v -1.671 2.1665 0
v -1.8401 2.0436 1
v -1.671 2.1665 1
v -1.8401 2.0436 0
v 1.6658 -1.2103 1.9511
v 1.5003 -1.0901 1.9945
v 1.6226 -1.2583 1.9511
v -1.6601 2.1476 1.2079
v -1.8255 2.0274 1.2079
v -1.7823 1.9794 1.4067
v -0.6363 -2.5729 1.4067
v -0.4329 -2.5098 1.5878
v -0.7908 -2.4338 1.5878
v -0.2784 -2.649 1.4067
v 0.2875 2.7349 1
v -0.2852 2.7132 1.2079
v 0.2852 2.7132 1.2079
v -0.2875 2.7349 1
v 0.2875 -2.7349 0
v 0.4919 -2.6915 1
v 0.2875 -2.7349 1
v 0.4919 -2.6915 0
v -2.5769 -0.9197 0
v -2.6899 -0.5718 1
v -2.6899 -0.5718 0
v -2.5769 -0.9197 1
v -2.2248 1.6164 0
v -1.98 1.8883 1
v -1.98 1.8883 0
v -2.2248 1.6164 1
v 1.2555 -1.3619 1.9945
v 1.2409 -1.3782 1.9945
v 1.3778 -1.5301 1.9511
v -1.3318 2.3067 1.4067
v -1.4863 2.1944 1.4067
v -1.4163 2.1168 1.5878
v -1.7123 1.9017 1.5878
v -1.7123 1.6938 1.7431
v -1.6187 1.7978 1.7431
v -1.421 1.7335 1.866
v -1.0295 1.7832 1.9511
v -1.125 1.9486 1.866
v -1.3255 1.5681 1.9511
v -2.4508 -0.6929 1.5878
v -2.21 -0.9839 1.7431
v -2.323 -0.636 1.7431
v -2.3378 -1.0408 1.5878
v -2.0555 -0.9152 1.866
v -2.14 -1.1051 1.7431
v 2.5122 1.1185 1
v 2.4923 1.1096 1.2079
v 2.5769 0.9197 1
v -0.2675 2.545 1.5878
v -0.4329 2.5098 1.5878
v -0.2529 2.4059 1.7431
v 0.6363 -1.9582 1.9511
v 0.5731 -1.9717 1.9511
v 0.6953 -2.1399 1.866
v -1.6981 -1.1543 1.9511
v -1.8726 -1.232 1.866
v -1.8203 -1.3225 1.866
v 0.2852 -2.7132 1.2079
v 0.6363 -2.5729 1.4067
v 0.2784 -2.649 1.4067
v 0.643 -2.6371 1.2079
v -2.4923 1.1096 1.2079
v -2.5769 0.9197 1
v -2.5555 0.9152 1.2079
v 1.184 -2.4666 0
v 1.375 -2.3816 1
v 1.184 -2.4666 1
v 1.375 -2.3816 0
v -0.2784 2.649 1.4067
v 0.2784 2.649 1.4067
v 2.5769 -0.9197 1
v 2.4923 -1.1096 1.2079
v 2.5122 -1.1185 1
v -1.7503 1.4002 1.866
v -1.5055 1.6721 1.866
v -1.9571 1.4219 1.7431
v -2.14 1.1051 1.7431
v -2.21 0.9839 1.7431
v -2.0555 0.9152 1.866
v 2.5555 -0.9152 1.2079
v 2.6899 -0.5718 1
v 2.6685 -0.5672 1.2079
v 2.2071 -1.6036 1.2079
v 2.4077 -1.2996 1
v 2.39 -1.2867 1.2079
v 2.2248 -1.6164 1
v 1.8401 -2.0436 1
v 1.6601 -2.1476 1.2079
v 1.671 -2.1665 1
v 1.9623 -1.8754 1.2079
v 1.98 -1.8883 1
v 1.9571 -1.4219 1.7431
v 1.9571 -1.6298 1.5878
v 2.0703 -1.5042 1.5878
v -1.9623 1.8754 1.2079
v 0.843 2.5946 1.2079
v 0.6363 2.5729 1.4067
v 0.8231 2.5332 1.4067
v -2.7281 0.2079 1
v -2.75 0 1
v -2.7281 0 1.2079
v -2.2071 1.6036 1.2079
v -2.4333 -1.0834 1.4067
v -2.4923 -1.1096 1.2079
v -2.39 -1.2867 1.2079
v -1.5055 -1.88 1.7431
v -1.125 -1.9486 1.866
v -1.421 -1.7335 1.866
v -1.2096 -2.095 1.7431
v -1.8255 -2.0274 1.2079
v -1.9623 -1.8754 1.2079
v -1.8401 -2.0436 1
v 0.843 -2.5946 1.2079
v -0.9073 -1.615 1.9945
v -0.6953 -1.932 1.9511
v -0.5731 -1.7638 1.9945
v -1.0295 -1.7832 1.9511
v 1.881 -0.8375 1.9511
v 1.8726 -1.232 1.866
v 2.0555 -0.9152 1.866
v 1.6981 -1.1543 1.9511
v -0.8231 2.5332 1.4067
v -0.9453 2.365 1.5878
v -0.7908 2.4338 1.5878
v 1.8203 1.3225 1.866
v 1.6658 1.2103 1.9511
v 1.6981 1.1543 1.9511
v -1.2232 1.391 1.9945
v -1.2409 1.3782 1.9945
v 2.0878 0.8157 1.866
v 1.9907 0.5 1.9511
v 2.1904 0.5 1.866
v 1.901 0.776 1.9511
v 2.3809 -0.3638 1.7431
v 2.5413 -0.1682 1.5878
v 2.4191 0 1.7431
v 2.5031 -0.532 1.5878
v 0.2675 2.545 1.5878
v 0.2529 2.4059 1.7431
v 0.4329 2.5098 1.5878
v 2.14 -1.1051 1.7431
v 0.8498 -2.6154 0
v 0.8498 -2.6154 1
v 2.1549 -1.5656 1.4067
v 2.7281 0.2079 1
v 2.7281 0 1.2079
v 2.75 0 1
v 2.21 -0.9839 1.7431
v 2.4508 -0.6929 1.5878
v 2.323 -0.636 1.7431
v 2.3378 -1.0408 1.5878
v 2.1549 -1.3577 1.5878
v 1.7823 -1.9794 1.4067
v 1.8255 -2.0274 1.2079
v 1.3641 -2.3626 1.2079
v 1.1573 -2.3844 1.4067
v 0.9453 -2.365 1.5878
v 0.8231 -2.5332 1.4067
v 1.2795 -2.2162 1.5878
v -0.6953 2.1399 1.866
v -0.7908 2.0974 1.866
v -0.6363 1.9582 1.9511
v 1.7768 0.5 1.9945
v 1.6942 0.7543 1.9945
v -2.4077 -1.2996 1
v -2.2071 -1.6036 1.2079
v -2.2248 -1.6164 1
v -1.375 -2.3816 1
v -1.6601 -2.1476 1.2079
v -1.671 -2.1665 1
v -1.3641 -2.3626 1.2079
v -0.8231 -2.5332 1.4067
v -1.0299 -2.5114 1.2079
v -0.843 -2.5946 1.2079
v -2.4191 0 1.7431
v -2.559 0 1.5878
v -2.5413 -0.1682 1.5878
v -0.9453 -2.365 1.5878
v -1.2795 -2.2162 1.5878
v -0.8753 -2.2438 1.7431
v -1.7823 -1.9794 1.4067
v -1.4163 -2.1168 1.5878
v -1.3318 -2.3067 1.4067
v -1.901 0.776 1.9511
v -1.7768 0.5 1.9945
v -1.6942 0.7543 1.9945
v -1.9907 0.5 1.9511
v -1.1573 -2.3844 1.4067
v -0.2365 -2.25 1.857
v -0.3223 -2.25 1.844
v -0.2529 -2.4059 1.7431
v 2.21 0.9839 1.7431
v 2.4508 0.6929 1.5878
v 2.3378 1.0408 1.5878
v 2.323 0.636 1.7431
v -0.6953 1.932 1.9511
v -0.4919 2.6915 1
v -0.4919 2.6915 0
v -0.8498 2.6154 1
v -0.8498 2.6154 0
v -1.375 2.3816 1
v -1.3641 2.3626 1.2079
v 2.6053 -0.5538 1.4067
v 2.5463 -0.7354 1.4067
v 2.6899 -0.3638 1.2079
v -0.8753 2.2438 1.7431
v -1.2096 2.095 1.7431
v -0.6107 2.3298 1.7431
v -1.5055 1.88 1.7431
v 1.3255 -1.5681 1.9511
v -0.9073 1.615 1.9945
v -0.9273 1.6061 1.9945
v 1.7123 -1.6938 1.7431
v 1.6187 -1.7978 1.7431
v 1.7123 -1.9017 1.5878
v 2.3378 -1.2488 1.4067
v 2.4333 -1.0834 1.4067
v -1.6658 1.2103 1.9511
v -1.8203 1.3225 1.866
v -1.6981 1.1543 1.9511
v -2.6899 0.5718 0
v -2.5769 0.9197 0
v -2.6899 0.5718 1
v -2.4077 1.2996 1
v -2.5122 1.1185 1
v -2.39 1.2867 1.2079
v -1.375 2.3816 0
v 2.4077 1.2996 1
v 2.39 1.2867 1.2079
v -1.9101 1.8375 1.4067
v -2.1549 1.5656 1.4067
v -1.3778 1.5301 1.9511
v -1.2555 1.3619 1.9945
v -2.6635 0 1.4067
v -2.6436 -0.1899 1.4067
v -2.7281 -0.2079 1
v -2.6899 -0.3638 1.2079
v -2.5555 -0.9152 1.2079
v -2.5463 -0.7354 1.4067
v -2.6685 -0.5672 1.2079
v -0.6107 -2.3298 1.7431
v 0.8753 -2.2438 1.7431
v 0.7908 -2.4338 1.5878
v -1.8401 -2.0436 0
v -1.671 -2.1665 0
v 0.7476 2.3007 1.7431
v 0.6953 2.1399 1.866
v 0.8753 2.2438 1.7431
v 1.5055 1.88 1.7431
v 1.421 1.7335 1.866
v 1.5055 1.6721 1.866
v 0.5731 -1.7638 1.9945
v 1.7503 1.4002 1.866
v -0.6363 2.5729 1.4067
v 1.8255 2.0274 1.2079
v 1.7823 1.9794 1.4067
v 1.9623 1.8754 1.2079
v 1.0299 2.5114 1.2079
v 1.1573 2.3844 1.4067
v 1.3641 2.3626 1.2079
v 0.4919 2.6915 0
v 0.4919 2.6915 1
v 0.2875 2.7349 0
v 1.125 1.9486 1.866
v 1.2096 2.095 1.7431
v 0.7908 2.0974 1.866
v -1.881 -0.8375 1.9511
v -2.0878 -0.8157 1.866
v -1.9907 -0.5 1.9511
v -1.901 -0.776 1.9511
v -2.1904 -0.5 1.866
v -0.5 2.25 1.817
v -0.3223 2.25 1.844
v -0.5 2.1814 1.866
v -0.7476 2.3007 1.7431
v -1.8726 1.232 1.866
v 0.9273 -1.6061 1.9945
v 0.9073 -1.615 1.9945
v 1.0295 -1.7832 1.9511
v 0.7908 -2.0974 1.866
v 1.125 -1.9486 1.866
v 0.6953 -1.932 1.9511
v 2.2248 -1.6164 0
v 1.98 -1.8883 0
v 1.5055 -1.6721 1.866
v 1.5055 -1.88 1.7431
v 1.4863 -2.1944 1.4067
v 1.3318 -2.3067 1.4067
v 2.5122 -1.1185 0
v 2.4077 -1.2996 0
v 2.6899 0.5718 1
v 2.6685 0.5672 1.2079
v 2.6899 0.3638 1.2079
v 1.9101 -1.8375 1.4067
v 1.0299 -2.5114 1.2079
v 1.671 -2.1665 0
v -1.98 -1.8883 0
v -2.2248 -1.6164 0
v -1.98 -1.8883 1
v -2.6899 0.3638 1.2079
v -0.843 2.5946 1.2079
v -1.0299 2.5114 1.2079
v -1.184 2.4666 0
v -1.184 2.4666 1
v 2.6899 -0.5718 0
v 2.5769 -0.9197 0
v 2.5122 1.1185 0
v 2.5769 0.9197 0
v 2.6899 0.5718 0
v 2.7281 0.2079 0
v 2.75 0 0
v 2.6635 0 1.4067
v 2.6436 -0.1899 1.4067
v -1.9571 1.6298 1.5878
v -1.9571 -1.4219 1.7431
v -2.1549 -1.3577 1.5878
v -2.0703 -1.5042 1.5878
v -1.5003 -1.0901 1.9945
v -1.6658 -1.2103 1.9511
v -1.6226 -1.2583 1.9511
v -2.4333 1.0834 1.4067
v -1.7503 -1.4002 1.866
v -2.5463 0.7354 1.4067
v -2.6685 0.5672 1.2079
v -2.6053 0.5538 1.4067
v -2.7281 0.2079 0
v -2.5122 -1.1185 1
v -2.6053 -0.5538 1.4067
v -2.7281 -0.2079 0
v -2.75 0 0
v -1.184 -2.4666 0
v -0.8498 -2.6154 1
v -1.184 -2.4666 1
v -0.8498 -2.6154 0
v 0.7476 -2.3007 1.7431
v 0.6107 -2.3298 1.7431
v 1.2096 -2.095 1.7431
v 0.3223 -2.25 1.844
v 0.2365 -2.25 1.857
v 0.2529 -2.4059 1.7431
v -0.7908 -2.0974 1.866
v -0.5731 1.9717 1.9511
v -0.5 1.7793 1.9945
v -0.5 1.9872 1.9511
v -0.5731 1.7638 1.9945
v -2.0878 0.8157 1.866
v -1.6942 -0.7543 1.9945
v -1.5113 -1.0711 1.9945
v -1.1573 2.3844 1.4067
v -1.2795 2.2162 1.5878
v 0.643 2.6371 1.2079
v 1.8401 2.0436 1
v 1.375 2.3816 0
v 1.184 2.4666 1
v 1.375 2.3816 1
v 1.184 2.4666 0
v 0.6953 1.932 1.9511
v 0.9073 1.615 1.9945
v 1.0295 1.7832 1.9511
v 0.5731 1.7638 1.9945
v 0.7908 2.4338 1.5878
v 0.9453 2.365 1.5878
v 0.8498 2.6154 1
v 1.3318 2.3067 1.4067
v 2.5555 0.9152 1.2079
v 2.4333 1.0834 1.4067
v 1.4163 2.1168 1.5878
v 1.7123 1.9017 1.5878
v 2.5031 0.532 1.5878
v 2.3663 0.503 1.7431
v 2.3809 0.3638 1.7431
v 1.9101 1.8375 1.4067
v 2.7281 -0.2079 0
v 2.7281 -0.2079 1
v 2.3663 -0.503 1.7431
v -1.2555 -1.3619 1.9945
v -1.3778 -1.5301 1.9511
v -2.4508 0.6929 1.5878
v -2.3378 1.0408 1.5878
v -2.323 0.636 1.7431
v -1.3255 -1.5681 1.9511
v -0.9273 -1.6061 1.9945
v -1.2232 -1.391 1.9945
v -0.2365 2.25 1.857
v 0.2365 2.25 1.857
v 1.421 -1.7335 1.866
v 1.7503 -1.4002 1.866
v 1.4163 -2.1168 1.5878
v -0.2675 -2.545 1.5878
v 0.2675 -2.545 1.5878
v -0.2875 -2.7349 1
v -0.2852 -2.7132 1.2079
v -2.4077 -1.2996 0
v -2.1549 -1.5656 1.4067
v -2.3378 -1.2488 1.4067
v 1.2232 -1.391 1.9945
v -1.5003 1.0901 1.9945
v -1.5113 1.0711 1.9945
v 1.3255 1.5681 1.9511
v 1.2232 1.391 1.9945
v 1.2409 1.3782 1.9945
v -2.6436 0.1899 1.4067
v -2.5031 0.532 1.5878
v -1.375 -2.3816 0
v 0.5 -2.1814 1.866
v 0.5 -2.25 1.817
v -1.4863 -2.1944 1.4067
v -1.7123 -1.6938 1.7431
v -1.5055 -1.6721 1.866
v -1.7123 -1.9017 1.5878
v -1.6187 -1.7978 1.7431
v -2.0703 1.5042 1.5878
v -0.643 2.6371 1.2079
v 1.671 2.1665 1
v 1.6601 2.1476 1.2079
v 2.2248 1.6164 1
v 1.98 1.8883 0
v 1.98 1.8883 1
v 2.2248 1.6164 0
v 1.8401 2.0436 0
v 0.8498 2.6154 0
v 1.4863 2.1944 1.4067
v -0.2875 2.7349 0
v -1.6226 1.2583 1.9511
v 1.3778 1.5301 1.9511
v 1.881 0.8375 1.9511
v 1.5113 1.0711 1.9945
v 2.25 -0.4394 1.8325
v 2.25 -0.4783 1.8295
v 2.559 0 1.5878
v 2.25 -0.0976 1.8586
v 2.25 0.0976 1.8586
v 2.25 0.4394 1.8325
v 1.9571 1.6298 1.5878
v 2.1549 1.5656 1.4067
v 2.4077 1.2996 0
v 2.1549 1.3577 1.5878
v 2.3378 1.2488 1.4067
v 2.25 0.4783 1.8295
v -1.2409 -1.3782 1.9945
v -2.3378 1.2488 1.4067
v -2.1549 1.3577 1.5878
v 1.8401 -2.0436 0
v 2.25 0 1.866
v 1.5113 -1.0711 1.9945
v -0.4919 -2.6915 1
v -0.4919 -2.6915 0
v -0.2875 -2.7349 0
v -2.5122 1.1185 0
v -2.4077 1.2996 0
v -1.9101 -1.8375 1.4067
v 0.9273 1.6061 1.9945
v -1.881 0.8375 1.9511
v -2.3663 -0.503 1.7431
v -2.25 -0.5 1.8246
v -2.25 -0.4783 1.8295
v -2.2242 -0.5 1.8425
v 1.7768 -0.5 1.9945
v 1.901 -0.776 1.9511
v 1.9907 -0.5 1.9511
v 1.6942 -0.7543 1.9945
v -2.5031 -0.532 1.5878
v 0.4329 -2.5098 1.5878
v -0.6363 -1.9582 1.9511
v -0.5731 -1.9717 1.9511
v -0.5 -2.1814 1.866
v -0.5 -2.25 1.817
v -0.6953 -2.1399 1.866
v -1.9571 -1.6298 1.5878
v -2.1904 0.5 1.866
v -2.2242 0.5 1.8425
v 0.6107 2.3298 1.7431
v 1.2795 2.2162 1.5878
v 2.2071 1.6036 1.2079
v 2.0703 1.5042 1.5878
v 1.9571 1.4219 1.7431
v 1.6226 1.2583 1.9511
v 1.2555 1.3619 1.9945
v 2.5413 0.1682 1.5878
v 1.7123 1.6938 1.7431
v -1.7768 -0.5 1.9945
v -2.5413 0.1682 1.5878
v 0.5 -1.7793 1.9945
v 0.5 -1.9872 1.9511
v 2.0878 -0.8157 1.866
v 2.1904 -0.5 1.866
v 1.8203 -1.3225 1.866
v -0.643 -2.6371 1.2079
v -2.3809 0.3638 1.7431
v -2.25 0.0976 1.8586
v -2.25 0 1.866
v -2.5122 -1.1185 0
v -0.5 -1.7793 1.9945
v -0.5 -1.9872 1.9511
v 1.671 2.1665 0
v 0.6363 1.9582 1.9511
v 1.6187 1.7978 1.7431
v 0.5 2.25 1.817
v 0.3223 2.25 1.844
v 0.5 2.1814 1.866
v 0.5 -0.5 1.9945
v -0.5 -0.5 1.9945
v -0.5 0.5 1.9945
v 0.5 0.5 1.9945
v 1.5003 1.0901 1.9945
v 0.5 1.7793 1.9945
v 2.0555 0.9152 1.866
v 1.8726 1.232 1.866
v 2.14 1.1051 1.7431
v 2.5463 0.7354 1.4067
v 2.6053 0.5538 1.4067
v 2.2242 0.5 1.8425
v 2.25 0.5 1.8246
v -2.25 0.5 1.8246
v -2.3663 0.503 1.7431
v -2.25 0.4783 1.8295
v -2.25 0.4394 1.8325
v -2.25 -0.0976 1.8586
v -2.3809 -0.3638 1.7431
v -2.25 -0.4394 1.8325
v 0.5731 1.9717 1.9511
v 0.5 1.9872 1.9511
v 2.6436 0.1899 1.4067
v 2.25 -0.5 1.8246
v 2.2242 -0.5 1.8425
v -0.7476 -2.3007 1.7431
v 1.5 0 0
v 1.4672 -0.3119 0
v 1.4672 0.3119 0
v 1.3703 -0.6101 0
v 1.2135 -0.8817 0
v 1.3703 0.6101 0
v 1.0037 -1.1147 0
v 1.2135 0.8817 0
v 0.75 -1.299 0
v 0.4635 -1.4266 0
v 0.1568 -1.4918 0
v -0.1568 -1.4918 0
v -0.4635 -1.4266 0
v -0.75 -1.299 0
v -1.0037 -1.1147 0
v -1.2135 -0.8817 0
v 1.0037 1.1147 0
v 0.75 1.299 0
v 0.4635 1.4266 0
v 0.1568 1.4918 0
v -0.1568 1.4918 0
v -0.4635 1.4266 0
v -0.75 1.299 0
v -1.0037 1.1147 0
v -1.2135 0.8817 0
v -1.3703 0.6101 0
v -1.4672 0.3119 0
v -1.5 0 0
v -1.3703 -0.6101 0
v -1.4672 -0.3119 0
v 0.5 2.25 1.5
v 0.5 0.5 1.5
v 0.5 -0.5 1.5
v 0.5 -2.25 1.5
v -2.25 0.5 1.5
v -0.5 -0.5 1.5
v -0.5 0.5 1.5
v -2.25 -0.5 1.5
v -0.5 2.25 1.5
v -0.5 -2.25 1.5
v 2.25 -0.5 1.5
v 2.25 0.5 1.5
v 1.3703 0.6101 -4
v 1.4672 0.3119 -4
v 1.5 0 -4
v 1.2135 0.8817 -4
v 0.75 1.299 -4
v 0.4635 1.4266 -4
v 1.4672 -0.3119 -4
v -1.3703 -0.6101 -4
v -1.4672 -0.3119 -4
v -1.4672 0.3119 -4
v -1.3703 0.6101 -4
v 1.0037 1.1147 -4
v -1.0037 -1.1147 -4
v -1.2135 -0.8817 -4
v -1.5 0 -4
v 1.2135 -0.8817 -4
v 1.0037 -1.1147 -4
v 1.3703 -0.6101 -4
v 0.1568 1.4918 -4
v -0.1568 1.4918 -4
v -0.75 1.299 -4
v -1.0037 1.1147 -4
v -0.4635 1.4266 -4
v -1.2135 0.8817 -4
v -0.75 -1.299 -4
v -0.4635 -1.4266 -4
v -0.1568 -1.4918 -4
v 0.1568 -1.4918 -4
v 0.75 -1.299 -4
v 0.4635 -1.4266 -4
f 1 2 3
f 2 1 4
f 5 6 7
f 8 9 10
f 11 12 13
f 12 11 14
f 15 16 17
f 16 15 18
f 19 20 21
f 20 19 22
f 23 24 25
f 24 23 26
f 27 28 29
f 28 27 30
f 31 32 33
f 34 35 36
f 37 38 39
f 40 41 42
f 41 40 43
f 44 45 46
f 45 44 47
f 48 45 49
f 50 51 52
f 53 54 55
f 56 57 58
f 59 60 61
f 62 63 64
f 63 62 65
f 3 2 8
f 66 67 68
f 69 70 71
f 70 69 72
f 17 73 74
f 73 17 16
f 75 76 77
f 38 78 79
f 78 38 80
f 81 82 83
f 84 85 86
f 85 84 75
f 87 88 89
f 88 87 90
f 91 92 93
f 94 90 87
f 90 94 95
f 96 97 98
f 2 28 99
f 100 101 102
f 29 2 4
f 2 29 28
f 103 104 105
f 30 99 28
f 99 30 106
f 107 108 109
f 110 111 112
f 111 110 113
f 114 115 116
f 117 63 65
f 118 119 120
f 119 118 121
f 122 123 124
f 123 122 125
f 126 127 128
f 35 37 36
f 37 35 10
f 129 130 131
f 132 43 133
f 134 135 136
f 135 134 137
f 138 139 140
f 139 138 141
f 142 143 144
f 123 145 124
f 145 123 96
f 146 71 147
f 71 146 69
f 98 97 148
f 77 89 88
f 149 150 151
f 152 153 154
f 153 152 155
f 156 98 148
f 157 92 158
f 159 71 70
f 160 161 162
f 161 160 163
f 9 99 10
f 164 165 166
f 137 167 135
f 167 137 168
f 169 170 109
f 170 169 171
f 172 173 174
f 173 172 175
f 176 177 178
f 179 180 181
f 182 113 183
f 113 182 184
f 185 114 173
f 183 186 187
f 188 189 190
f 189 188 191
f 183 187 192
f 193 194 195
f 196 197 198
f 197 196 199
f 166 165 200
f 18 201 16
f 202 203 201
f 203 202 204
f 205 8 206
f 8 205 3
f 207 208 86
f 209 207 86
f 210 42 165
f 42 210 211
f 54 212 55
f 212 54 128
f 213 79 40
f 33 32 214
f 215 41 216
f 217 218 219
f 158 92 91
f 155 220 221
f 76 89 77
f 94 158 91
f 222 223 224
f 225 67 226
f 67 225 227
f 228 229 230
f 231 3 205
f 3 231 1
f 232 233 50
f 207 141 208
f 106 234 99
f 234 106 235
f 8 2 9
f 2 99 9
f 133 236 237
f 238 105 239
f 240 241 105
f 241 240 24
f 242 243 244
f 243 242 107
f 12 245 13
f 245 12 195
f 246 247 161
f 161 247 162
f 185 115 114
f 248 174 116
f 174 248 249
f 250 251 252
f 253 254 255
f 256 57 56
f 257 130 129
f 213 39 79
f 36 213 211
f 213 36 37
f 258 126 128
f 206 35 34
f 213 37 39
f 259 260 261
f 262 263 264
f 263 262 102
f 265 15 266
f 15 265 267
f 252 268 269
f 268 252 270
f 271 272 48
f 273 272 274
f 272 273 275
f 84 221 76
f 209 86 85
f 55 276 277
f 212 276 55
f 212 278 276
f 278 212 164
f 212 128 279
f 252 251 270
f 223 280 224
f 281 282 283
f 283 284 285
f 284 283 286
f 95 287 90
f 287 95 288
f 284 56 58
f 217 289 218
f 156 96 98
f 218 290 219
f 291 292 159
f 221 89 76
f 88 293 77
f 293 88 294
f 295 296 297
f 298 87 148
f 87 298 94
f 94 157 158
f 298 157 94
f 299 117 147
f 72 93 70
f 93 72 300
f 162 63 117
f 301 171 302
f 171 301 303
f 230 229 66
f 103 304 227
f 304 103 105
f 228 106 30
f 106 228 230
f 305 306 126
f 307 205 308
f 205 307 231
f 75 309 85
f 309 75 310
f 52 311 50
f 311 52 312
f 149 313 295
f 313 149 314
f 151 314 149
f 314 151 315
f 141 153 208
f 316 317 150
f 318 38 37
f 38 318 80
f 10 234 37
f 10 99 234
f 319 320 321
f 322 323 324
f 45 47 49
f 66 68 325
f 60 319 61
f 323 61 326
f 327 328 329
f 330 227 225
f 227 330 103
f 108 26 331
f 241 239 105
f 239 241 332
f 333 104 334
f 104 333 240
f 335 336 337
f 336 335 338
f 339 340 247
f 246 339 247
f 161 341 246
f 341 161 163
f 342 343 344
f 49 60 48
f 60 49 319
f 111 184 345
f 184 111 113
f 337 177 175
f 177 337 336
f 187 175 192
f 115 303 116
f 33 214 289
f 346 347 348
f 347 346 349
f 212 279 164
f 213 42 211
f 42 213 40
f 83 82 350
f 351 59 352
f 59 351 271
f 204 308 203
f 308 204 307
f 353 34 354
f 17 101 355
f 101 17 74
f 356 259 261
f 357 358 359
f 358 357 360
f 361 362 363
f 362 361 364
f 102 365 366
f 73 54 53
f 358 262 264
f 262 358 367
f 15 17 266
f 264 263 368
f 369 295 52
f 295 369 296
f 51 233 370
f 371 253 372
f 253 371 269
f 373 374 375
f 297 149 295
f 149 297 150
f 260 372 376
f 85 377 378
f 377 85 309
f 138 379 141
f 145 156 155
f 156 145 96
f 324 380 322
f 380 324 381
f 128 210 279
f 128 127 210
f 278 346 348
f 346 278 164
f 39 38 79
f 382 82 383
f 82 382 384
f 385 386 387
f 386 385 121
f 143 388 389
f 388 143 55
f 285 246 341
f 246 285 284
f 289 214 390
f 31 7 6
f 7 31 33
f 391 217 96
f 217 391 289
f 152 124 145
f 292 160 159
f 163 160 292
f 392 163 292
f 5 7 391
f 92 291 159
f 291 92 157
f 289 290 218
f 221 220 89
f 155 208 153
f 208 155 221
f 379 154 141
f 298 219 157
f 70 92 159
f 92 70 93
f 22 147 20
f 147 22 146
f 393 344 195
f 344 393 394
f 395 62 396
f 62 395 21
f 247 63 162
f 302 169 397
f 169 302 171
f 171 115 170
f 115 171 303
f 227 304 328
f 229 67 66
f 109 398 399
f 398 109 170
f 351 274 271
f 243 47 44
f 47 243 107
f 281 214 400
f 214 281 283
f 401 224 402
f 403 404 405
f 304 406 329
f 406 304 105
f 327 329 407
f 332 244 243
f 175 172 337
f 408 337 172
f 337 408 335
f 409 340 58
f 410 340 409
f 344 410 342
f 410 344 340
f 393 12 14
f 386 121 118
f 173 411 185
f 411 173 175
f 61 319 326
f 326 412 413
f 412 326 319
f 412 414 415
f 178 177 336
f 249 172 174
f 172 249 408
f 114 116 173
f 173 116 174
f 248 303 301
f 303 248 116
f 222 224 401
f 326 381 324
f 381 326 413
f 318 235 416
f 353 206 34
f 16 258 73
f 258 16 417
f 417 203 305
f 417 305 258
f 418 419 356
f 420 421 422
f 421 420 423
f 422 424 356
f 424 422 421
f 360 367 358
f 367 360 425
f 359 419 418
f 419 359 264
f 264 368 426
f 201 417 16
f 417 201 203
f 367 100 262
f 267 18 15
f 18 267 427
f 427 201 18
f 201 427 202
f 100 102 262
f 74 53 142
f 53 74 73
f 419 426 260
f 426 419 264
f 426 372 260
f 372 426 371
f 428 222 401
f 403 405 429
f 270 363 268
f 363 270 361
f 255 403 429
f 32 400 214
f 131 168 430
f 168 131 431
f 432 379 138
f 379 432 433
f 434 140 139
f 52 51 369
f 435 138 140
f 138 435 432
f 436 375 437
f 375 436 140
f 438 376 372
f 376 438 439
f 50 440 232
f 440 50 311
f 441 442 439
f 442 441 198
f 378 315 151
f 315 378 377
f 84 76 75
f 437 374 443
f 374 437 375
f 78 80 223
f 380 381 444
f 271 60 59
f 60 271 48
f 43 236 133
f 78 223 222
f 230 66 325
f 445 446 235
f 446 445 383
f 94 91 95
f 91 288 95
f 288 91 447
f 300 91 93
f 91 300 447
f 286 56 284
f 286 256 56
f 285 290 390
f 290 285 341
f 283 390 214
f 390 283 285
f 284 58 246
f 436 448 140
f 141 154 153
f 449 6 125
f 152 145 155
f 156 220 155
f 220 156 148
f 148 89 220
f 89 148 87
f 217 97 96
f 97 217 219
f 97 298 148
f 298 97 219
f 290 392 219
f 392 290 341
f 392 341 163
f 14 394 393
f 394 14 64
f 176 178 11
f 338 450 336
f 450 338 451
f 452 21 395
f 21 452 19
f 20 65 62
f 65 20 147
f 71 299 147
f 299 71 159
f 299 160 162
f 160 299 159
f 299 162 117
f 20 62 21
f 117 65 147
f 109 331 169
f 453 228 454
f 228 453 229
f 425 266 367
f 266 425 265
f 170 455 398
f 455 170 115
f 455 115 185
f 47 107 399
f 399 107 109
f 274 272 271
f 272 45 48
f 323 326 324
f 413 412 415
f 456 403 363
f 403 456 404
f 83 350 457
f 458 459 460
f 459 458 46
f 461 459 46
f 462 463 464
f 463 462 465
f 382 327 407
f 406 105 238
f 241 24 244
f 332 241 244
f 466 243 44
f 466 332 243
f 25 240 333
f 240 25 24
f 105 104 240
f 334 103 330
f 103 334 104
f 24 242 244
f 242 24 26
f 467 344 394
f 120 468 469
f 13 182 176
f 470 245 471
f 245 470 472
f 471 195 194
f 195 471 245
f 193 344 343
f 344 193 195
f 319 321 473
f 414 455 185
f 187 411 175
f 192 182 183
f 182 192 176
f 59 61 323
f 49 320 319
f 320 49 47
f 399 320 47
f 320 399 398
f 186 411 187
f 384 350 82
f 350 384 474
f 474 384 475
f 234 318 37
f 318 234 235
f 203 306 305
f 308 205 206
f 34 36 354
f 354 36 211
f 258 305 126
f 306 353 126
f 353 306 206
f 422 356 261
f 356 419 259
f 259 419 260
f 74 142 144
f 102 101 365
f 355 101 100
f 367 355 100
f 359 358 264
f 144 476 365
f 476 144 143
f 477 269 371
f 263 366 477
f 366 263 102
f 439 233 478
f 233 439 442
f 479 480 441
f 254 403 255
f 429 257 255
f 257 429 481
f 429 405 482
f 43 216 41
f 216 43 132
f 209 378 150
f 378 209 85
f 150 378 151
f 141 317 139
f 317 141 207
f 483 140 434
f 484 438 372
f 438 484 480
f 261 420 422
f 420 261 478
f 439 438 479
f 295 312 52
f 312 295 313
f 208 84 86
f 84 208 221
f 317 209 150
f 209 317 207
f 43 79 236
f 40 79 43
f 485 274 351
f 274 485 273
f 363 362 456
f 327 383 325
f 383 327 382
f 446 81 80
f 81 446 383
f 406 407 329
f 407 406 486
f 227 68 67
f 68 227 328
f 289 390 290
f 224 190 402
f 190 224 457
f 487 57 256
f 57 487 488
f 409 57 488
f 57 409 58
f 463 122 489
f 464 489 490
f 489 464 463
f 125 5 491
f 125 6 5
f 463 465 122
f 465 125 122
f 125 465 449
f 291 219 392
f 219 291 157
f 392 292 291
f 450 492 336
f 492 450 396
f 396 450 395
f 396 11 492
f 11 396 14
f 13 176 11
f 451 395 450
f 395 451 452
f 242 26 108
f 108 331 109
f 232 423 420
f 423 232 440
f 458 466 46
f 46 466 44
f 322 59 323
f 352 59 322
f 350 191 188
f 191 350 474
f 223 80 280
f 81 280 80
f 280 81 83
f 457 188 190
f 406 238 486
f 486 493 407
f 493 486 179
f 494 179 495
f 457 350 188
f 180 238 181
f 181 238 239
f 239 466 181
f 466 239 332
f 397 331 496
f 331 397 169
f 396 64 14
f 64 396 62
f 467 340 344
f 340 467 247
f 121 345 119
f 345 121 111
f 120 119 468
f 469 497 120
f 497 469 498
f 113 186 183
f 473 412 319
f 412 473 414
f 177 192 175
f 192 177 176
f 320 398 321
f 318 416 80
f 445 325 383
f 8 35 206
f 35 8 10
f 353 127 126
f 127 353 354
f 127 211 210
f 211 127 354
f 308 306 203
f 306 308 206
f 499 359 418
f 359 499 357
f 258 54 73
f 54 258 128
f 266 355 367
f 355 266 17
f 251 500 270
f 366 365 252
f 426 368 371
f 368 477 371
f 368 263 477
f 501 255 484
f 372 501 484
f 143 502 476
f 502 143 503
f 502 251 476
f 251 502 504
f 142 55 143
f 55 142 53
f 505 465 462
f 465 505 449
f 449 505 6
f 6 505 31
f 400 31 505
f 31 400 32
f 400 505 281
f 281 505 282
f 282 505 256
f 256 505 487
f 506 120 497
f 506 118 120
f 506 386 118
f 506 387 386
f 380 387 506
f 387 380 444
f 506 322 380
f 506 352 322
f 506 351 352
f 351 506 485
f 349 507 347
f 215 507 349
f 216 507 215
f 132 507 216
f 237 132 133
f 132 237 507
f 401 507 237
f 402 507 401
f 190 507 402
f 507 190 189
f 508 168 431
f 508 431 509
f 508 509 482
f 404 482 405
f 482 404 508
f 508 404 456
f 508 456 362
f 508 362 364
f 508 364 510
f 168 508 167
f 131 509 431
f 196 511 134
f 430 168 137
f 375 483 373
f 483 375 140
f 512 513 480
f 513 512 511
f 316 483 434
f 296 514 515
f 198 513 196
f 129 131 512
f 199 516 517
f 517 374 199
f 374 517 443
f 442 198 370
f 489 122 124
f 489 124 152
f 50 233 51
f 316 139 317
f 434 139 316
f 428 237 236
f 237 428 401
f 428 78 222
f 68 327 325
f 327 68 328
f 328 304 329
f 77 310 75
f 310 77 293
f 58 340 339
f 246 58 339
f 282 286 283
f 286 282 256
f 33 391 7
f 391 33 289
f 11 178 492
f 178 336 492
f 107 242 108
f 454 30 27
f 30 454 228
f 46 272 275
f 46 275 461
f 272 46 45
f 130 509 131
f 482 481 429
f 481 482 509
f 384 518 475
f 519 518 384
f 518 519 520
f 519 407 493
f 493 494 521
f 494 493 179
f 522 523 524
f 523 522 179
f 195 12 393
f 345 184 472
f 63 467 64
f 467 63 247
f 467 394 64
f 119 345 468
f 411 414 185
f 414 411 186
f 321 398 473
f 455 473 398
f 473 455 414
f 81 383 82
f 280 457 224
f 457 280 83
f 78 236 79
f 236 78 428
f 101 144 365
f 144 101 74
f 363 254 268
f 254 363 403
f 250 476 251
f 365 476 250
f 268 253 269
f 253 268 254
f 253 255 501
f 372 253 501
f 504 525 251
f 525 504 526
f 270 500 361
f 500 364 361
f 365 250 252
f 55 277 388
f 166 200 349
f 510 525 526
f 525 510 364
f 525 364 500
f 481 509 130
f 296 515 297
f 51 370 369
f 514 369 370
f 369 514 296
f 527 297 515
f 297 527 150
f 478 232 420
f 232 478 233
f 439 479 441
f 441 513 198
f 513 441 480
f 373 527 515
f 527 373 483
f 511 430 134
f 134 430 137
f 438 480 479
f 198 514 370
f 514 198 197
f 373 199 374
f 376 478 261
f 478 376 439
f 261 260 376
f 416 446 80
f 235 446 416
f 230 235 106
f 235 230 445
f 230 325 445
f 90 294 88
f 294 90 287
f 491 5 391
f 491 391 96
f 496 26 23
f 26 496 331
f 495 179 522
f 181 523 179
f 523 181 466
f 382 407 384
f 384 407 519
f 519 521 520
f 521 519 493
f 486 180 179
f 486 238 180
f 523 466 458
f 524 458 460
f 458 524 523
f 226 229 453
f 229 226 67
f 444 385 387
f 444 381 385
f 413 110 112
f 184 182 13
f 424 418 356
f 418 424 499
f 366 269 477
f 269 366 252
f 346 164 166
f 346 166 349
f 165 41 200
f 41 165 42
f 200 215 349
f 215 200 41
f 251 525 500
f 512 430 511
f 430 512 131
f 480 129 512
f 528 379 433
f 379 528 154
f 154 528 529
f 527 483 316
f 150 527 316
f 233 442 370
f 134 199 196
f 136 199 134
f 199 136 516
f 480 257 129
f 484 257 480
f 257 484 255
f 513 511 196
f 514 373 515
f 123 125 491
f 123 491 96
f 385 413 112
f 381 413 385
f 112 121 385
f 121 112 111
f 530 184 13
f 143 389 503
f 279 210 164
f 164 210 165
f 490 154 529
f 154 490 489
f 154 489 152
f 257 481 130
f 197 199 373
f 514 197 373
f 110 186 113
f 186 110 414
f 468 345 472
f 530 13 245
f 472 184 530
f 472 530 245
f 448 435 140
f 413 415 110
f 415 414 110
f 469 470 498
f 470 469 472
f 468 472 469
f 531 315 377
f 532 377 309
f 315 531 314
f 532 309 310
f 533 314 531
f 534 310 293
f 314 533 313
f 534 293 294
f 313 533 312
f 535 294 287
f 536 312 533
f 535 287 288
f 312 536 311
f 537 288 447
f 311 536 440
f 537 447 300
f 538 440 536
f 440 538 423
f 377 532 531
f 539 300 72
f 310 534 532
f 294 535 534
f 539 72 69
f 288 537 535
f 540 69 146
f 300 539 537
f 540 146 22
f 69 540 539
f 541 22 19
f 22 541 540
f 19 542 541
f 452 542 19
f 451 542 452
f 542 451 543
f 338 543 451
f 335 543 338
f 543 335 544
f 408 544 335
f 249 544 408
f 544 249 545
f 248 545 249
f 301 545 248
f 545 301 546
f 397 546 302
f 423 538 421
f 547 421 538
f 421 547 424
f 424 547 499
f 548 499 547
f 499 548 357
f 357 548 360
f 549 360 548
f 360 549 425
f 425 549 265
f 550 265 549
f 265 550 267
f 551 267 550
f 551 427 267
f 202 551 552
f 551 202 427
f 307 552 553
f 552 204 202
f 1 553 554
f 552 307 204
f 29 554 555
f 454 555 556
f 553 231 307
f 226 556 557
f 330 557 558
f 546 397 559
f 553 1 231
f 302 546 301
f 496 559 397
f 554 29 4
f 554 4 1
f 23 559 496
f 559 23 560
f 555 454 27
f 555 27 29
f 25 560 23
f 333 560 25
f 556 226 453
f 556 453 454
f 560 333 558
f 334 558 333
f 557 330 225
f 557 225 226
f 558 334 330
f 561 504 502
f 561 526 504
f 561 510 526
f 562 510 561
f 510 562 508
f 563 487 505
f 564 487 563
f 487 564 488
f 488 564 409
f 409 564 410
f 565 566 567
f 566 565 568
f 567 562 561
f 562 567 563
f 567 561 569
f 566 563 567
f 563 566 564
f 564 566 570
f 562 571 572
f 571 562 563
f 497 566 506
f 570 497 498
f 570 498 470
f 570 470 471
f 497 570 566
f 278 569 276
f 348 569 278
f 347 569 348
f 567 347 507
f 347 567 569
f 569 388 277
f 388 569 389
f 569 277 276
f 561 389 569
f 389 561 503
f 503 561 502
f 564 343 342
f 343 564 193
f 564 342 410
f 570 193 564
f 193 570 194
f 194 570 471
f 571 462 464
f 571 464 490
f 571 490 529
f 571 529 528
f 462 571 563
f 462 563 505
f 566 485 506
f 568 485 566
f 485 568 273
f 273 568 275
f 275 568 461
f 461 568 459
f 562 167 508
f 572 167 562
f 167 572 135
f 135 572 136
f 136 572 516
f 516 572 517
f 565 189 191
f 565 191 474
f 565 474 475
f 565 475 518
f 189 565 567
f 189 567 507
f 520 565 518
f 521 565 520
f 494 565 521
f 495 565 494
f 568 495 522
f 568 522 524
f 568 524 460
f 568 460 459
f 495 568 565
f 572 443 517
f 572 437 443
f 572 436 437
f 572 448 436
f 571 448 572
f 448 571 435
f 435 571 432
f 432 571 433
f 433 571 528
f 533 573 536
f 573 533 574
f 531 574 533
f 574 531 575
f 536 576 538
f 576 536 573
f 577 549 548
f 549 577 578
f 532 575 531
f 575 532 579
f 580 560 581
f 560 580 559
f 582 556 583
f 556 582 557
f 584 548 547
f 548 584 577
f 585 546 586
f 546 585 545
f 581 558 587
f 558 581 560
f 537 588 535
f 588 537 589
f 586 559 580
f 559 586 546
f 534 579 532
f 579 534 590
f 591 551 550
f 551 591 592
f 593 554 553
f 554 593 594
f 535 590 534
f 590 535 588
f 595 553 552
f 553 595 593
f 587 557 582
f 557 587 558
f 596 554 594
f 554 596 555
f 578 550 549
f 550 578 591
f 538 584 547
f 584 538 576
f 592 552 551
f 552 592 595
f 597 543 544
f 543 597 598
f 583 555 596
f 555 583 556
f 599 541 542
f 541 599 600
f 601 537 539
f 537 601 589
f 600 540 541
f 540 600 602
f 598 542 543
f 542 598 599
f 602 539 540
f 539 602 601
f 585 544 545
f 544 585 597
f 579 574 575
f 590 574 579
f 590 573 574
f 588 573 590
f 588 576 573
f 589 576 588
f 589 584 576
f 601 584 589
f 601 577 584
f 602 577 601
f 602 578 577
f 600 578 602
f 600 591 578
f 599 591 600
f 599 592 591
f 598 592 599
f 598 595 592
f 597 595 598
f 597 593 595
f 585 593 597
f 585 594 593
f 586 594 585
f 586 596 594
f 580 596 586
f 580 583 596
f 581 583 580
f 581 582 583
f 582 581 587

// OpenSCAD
//M3 screw
//https://www.nittoseiko.co.jp/nitto-blog/2017/08/25/6

module screw(sd, length, hd, k){
  $fs=0.01;
  //sd=screw diameter
  //length=screw length
  //hd=head diameter
  //k=head height
  screwhead(hd, k);
  translate([0,0,-length])
  cylinder(h=length, d=sd);
}
screw(3,4,5.5,2);

module screwhead(diameter, k){
  $fs=0.01;
  difference(){
    minkowski(){
      translate([0,0,0])sphere(r=k/2);
      cylinder(h=k/2, r=(diameter/2)-(k/2));
    }
      translate([0,0,-(k+1)/2]) cube([diameter*1.5,diameter*1.5,k+1], center=true);
      translate([0,0,k])cube([1,diameter-1,k-1], center=true);
      translate([0,0,k])
      rotate([90,90,0])
      cube([1,diameter-1,k-1], center=true);
  }
}
